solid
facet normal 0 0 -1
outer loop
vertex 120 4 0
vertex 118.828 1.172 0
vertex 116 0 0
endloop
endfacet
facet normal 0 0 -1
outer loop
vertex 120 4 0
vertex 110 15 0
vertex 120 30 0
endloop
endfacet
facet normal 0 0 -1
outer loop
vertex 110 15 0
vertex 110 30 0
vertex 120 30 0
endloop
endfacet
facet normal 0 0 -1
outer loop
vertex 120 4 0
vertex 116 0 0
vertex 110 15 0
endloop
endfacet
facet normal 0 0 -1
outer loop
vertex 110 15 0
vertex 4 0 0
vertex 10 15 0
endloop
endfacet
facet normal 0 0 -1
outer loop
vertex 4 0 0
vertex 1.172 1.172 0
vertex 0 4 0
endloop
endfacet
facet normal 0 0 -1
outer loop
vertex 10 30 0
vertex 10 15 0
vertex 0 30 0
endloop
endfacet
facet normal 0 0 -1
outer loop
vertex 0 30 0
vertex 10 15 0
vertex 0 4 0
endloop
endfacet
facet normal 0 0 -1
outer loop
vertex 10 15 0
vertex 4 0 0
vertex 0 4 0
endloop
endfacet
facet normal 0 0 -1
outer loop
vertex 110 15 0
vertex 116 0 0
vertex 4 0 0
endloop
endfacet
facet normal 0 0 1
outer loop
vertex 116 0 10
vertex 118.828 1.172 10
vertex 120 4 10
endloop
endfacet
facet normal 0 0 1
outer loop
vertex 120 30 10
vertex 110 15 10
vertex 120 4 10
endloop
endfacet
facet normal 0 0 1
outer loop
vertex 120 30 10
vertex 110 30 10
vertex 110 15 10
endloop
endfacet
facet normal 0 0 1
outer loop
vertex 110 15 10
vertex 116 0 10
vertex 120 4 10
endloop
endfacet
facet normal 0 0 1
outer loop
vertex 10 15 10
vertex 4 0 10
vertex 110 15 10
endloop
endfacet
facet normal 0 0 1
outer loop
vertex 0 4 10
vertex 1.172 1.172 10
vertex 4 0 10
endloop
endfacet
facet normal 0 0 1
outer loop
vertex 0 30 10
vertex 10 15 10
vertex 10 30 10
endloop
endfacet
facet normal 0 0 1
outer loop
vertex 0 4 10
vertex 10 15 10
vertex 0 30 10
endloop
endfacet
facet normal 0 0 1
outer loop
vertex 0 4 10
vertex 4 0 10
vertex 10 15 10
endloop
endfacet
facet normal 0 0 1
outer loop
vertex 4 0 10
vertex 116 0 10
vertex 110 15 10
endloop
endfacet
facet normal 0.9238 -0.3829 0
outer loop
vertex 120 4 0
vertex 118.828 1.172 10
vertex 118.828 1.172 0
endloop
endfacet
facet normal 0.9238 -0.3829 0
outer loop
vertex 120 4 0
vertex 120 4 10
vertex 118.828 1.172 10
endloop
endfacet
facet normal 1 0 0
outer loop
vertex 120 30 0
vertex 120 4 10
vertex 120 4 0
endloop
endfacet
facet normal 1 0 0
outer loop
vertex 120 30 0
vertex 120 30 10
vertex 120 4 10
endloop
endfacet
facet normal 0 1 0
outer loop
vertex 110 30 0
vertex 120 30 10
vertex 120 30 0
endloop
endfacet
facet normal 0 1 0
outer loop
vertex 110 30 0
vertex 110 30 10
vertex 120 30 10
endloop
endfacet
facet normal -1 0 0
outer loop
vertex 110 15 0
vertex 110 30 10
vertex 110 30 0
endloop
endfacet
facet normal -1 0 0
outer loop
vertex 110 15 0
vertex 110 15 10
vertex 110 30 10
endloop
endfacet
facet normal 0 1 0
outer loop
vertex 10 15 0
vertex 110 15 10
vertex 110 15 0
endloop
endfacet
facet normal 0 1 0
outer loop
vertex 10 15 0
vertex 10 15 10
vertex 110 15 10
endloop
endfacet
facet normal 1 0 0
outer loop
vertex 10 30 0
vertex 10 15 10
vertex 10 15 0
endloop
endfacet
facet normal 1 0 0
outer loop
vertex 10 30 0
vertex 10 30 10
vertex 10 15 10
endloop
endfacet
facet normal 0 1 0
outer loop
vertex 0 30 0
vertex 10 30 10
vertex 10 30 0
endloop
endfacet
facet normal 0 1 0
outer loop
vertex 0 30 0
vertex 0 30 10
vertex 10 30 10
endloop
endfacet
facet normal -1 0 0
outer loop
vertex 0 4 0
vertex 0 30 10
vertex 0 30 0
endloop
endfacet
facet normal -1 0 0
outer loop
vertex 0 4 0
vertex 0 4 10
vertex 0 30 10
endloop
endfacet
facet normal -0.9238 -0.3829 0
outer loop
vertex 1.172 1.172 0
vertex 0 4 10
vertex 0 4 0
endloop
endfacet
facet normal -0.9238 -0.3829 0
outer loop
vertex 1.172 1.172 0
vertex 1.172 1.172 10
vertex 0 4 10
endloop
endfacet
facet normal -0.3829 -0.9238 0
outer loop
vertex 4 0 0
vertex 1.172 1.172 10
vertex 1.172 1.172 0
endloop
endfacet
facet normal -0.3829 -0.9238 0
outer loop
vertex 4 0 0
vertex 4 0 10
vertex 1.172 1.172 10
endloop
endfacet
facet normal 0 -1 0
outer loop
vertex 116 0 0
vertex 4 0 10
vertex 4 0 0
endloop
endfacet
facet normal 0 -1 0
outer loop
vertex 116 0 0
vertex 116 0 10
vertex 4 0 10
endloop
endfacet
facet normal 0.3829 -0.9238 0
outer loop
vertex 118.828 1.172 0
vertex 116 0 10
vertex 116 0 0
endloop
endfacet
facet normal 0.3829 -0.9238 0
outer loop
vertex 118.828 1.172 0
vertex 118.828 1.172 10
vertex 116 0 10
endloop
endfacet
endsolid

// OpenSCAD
$fn = 32;

// ----------------------------------------------------------------------
// Heat sink frame: 120 x 30 mm frame, 10 mm walls
// ----------------------------------------------------------------------

// --- parameters (mm) ---
profile_height = 10;      // extrusion height
profile_points = 12;      // points of the closed outline

profile = [[0, 4], [1.172, 1.172], [4, 0], [116, 0], [118.828, 1.172], [120, 4], [120, 30], [110, 30], [110, 15], [10, 15], [10, 30], [0, 30]];  // single closed polygon, 12 points, counter clockwise

// --- the one profile operation ---
linear_extrude(height = profile_height) polygon(points = profile);
